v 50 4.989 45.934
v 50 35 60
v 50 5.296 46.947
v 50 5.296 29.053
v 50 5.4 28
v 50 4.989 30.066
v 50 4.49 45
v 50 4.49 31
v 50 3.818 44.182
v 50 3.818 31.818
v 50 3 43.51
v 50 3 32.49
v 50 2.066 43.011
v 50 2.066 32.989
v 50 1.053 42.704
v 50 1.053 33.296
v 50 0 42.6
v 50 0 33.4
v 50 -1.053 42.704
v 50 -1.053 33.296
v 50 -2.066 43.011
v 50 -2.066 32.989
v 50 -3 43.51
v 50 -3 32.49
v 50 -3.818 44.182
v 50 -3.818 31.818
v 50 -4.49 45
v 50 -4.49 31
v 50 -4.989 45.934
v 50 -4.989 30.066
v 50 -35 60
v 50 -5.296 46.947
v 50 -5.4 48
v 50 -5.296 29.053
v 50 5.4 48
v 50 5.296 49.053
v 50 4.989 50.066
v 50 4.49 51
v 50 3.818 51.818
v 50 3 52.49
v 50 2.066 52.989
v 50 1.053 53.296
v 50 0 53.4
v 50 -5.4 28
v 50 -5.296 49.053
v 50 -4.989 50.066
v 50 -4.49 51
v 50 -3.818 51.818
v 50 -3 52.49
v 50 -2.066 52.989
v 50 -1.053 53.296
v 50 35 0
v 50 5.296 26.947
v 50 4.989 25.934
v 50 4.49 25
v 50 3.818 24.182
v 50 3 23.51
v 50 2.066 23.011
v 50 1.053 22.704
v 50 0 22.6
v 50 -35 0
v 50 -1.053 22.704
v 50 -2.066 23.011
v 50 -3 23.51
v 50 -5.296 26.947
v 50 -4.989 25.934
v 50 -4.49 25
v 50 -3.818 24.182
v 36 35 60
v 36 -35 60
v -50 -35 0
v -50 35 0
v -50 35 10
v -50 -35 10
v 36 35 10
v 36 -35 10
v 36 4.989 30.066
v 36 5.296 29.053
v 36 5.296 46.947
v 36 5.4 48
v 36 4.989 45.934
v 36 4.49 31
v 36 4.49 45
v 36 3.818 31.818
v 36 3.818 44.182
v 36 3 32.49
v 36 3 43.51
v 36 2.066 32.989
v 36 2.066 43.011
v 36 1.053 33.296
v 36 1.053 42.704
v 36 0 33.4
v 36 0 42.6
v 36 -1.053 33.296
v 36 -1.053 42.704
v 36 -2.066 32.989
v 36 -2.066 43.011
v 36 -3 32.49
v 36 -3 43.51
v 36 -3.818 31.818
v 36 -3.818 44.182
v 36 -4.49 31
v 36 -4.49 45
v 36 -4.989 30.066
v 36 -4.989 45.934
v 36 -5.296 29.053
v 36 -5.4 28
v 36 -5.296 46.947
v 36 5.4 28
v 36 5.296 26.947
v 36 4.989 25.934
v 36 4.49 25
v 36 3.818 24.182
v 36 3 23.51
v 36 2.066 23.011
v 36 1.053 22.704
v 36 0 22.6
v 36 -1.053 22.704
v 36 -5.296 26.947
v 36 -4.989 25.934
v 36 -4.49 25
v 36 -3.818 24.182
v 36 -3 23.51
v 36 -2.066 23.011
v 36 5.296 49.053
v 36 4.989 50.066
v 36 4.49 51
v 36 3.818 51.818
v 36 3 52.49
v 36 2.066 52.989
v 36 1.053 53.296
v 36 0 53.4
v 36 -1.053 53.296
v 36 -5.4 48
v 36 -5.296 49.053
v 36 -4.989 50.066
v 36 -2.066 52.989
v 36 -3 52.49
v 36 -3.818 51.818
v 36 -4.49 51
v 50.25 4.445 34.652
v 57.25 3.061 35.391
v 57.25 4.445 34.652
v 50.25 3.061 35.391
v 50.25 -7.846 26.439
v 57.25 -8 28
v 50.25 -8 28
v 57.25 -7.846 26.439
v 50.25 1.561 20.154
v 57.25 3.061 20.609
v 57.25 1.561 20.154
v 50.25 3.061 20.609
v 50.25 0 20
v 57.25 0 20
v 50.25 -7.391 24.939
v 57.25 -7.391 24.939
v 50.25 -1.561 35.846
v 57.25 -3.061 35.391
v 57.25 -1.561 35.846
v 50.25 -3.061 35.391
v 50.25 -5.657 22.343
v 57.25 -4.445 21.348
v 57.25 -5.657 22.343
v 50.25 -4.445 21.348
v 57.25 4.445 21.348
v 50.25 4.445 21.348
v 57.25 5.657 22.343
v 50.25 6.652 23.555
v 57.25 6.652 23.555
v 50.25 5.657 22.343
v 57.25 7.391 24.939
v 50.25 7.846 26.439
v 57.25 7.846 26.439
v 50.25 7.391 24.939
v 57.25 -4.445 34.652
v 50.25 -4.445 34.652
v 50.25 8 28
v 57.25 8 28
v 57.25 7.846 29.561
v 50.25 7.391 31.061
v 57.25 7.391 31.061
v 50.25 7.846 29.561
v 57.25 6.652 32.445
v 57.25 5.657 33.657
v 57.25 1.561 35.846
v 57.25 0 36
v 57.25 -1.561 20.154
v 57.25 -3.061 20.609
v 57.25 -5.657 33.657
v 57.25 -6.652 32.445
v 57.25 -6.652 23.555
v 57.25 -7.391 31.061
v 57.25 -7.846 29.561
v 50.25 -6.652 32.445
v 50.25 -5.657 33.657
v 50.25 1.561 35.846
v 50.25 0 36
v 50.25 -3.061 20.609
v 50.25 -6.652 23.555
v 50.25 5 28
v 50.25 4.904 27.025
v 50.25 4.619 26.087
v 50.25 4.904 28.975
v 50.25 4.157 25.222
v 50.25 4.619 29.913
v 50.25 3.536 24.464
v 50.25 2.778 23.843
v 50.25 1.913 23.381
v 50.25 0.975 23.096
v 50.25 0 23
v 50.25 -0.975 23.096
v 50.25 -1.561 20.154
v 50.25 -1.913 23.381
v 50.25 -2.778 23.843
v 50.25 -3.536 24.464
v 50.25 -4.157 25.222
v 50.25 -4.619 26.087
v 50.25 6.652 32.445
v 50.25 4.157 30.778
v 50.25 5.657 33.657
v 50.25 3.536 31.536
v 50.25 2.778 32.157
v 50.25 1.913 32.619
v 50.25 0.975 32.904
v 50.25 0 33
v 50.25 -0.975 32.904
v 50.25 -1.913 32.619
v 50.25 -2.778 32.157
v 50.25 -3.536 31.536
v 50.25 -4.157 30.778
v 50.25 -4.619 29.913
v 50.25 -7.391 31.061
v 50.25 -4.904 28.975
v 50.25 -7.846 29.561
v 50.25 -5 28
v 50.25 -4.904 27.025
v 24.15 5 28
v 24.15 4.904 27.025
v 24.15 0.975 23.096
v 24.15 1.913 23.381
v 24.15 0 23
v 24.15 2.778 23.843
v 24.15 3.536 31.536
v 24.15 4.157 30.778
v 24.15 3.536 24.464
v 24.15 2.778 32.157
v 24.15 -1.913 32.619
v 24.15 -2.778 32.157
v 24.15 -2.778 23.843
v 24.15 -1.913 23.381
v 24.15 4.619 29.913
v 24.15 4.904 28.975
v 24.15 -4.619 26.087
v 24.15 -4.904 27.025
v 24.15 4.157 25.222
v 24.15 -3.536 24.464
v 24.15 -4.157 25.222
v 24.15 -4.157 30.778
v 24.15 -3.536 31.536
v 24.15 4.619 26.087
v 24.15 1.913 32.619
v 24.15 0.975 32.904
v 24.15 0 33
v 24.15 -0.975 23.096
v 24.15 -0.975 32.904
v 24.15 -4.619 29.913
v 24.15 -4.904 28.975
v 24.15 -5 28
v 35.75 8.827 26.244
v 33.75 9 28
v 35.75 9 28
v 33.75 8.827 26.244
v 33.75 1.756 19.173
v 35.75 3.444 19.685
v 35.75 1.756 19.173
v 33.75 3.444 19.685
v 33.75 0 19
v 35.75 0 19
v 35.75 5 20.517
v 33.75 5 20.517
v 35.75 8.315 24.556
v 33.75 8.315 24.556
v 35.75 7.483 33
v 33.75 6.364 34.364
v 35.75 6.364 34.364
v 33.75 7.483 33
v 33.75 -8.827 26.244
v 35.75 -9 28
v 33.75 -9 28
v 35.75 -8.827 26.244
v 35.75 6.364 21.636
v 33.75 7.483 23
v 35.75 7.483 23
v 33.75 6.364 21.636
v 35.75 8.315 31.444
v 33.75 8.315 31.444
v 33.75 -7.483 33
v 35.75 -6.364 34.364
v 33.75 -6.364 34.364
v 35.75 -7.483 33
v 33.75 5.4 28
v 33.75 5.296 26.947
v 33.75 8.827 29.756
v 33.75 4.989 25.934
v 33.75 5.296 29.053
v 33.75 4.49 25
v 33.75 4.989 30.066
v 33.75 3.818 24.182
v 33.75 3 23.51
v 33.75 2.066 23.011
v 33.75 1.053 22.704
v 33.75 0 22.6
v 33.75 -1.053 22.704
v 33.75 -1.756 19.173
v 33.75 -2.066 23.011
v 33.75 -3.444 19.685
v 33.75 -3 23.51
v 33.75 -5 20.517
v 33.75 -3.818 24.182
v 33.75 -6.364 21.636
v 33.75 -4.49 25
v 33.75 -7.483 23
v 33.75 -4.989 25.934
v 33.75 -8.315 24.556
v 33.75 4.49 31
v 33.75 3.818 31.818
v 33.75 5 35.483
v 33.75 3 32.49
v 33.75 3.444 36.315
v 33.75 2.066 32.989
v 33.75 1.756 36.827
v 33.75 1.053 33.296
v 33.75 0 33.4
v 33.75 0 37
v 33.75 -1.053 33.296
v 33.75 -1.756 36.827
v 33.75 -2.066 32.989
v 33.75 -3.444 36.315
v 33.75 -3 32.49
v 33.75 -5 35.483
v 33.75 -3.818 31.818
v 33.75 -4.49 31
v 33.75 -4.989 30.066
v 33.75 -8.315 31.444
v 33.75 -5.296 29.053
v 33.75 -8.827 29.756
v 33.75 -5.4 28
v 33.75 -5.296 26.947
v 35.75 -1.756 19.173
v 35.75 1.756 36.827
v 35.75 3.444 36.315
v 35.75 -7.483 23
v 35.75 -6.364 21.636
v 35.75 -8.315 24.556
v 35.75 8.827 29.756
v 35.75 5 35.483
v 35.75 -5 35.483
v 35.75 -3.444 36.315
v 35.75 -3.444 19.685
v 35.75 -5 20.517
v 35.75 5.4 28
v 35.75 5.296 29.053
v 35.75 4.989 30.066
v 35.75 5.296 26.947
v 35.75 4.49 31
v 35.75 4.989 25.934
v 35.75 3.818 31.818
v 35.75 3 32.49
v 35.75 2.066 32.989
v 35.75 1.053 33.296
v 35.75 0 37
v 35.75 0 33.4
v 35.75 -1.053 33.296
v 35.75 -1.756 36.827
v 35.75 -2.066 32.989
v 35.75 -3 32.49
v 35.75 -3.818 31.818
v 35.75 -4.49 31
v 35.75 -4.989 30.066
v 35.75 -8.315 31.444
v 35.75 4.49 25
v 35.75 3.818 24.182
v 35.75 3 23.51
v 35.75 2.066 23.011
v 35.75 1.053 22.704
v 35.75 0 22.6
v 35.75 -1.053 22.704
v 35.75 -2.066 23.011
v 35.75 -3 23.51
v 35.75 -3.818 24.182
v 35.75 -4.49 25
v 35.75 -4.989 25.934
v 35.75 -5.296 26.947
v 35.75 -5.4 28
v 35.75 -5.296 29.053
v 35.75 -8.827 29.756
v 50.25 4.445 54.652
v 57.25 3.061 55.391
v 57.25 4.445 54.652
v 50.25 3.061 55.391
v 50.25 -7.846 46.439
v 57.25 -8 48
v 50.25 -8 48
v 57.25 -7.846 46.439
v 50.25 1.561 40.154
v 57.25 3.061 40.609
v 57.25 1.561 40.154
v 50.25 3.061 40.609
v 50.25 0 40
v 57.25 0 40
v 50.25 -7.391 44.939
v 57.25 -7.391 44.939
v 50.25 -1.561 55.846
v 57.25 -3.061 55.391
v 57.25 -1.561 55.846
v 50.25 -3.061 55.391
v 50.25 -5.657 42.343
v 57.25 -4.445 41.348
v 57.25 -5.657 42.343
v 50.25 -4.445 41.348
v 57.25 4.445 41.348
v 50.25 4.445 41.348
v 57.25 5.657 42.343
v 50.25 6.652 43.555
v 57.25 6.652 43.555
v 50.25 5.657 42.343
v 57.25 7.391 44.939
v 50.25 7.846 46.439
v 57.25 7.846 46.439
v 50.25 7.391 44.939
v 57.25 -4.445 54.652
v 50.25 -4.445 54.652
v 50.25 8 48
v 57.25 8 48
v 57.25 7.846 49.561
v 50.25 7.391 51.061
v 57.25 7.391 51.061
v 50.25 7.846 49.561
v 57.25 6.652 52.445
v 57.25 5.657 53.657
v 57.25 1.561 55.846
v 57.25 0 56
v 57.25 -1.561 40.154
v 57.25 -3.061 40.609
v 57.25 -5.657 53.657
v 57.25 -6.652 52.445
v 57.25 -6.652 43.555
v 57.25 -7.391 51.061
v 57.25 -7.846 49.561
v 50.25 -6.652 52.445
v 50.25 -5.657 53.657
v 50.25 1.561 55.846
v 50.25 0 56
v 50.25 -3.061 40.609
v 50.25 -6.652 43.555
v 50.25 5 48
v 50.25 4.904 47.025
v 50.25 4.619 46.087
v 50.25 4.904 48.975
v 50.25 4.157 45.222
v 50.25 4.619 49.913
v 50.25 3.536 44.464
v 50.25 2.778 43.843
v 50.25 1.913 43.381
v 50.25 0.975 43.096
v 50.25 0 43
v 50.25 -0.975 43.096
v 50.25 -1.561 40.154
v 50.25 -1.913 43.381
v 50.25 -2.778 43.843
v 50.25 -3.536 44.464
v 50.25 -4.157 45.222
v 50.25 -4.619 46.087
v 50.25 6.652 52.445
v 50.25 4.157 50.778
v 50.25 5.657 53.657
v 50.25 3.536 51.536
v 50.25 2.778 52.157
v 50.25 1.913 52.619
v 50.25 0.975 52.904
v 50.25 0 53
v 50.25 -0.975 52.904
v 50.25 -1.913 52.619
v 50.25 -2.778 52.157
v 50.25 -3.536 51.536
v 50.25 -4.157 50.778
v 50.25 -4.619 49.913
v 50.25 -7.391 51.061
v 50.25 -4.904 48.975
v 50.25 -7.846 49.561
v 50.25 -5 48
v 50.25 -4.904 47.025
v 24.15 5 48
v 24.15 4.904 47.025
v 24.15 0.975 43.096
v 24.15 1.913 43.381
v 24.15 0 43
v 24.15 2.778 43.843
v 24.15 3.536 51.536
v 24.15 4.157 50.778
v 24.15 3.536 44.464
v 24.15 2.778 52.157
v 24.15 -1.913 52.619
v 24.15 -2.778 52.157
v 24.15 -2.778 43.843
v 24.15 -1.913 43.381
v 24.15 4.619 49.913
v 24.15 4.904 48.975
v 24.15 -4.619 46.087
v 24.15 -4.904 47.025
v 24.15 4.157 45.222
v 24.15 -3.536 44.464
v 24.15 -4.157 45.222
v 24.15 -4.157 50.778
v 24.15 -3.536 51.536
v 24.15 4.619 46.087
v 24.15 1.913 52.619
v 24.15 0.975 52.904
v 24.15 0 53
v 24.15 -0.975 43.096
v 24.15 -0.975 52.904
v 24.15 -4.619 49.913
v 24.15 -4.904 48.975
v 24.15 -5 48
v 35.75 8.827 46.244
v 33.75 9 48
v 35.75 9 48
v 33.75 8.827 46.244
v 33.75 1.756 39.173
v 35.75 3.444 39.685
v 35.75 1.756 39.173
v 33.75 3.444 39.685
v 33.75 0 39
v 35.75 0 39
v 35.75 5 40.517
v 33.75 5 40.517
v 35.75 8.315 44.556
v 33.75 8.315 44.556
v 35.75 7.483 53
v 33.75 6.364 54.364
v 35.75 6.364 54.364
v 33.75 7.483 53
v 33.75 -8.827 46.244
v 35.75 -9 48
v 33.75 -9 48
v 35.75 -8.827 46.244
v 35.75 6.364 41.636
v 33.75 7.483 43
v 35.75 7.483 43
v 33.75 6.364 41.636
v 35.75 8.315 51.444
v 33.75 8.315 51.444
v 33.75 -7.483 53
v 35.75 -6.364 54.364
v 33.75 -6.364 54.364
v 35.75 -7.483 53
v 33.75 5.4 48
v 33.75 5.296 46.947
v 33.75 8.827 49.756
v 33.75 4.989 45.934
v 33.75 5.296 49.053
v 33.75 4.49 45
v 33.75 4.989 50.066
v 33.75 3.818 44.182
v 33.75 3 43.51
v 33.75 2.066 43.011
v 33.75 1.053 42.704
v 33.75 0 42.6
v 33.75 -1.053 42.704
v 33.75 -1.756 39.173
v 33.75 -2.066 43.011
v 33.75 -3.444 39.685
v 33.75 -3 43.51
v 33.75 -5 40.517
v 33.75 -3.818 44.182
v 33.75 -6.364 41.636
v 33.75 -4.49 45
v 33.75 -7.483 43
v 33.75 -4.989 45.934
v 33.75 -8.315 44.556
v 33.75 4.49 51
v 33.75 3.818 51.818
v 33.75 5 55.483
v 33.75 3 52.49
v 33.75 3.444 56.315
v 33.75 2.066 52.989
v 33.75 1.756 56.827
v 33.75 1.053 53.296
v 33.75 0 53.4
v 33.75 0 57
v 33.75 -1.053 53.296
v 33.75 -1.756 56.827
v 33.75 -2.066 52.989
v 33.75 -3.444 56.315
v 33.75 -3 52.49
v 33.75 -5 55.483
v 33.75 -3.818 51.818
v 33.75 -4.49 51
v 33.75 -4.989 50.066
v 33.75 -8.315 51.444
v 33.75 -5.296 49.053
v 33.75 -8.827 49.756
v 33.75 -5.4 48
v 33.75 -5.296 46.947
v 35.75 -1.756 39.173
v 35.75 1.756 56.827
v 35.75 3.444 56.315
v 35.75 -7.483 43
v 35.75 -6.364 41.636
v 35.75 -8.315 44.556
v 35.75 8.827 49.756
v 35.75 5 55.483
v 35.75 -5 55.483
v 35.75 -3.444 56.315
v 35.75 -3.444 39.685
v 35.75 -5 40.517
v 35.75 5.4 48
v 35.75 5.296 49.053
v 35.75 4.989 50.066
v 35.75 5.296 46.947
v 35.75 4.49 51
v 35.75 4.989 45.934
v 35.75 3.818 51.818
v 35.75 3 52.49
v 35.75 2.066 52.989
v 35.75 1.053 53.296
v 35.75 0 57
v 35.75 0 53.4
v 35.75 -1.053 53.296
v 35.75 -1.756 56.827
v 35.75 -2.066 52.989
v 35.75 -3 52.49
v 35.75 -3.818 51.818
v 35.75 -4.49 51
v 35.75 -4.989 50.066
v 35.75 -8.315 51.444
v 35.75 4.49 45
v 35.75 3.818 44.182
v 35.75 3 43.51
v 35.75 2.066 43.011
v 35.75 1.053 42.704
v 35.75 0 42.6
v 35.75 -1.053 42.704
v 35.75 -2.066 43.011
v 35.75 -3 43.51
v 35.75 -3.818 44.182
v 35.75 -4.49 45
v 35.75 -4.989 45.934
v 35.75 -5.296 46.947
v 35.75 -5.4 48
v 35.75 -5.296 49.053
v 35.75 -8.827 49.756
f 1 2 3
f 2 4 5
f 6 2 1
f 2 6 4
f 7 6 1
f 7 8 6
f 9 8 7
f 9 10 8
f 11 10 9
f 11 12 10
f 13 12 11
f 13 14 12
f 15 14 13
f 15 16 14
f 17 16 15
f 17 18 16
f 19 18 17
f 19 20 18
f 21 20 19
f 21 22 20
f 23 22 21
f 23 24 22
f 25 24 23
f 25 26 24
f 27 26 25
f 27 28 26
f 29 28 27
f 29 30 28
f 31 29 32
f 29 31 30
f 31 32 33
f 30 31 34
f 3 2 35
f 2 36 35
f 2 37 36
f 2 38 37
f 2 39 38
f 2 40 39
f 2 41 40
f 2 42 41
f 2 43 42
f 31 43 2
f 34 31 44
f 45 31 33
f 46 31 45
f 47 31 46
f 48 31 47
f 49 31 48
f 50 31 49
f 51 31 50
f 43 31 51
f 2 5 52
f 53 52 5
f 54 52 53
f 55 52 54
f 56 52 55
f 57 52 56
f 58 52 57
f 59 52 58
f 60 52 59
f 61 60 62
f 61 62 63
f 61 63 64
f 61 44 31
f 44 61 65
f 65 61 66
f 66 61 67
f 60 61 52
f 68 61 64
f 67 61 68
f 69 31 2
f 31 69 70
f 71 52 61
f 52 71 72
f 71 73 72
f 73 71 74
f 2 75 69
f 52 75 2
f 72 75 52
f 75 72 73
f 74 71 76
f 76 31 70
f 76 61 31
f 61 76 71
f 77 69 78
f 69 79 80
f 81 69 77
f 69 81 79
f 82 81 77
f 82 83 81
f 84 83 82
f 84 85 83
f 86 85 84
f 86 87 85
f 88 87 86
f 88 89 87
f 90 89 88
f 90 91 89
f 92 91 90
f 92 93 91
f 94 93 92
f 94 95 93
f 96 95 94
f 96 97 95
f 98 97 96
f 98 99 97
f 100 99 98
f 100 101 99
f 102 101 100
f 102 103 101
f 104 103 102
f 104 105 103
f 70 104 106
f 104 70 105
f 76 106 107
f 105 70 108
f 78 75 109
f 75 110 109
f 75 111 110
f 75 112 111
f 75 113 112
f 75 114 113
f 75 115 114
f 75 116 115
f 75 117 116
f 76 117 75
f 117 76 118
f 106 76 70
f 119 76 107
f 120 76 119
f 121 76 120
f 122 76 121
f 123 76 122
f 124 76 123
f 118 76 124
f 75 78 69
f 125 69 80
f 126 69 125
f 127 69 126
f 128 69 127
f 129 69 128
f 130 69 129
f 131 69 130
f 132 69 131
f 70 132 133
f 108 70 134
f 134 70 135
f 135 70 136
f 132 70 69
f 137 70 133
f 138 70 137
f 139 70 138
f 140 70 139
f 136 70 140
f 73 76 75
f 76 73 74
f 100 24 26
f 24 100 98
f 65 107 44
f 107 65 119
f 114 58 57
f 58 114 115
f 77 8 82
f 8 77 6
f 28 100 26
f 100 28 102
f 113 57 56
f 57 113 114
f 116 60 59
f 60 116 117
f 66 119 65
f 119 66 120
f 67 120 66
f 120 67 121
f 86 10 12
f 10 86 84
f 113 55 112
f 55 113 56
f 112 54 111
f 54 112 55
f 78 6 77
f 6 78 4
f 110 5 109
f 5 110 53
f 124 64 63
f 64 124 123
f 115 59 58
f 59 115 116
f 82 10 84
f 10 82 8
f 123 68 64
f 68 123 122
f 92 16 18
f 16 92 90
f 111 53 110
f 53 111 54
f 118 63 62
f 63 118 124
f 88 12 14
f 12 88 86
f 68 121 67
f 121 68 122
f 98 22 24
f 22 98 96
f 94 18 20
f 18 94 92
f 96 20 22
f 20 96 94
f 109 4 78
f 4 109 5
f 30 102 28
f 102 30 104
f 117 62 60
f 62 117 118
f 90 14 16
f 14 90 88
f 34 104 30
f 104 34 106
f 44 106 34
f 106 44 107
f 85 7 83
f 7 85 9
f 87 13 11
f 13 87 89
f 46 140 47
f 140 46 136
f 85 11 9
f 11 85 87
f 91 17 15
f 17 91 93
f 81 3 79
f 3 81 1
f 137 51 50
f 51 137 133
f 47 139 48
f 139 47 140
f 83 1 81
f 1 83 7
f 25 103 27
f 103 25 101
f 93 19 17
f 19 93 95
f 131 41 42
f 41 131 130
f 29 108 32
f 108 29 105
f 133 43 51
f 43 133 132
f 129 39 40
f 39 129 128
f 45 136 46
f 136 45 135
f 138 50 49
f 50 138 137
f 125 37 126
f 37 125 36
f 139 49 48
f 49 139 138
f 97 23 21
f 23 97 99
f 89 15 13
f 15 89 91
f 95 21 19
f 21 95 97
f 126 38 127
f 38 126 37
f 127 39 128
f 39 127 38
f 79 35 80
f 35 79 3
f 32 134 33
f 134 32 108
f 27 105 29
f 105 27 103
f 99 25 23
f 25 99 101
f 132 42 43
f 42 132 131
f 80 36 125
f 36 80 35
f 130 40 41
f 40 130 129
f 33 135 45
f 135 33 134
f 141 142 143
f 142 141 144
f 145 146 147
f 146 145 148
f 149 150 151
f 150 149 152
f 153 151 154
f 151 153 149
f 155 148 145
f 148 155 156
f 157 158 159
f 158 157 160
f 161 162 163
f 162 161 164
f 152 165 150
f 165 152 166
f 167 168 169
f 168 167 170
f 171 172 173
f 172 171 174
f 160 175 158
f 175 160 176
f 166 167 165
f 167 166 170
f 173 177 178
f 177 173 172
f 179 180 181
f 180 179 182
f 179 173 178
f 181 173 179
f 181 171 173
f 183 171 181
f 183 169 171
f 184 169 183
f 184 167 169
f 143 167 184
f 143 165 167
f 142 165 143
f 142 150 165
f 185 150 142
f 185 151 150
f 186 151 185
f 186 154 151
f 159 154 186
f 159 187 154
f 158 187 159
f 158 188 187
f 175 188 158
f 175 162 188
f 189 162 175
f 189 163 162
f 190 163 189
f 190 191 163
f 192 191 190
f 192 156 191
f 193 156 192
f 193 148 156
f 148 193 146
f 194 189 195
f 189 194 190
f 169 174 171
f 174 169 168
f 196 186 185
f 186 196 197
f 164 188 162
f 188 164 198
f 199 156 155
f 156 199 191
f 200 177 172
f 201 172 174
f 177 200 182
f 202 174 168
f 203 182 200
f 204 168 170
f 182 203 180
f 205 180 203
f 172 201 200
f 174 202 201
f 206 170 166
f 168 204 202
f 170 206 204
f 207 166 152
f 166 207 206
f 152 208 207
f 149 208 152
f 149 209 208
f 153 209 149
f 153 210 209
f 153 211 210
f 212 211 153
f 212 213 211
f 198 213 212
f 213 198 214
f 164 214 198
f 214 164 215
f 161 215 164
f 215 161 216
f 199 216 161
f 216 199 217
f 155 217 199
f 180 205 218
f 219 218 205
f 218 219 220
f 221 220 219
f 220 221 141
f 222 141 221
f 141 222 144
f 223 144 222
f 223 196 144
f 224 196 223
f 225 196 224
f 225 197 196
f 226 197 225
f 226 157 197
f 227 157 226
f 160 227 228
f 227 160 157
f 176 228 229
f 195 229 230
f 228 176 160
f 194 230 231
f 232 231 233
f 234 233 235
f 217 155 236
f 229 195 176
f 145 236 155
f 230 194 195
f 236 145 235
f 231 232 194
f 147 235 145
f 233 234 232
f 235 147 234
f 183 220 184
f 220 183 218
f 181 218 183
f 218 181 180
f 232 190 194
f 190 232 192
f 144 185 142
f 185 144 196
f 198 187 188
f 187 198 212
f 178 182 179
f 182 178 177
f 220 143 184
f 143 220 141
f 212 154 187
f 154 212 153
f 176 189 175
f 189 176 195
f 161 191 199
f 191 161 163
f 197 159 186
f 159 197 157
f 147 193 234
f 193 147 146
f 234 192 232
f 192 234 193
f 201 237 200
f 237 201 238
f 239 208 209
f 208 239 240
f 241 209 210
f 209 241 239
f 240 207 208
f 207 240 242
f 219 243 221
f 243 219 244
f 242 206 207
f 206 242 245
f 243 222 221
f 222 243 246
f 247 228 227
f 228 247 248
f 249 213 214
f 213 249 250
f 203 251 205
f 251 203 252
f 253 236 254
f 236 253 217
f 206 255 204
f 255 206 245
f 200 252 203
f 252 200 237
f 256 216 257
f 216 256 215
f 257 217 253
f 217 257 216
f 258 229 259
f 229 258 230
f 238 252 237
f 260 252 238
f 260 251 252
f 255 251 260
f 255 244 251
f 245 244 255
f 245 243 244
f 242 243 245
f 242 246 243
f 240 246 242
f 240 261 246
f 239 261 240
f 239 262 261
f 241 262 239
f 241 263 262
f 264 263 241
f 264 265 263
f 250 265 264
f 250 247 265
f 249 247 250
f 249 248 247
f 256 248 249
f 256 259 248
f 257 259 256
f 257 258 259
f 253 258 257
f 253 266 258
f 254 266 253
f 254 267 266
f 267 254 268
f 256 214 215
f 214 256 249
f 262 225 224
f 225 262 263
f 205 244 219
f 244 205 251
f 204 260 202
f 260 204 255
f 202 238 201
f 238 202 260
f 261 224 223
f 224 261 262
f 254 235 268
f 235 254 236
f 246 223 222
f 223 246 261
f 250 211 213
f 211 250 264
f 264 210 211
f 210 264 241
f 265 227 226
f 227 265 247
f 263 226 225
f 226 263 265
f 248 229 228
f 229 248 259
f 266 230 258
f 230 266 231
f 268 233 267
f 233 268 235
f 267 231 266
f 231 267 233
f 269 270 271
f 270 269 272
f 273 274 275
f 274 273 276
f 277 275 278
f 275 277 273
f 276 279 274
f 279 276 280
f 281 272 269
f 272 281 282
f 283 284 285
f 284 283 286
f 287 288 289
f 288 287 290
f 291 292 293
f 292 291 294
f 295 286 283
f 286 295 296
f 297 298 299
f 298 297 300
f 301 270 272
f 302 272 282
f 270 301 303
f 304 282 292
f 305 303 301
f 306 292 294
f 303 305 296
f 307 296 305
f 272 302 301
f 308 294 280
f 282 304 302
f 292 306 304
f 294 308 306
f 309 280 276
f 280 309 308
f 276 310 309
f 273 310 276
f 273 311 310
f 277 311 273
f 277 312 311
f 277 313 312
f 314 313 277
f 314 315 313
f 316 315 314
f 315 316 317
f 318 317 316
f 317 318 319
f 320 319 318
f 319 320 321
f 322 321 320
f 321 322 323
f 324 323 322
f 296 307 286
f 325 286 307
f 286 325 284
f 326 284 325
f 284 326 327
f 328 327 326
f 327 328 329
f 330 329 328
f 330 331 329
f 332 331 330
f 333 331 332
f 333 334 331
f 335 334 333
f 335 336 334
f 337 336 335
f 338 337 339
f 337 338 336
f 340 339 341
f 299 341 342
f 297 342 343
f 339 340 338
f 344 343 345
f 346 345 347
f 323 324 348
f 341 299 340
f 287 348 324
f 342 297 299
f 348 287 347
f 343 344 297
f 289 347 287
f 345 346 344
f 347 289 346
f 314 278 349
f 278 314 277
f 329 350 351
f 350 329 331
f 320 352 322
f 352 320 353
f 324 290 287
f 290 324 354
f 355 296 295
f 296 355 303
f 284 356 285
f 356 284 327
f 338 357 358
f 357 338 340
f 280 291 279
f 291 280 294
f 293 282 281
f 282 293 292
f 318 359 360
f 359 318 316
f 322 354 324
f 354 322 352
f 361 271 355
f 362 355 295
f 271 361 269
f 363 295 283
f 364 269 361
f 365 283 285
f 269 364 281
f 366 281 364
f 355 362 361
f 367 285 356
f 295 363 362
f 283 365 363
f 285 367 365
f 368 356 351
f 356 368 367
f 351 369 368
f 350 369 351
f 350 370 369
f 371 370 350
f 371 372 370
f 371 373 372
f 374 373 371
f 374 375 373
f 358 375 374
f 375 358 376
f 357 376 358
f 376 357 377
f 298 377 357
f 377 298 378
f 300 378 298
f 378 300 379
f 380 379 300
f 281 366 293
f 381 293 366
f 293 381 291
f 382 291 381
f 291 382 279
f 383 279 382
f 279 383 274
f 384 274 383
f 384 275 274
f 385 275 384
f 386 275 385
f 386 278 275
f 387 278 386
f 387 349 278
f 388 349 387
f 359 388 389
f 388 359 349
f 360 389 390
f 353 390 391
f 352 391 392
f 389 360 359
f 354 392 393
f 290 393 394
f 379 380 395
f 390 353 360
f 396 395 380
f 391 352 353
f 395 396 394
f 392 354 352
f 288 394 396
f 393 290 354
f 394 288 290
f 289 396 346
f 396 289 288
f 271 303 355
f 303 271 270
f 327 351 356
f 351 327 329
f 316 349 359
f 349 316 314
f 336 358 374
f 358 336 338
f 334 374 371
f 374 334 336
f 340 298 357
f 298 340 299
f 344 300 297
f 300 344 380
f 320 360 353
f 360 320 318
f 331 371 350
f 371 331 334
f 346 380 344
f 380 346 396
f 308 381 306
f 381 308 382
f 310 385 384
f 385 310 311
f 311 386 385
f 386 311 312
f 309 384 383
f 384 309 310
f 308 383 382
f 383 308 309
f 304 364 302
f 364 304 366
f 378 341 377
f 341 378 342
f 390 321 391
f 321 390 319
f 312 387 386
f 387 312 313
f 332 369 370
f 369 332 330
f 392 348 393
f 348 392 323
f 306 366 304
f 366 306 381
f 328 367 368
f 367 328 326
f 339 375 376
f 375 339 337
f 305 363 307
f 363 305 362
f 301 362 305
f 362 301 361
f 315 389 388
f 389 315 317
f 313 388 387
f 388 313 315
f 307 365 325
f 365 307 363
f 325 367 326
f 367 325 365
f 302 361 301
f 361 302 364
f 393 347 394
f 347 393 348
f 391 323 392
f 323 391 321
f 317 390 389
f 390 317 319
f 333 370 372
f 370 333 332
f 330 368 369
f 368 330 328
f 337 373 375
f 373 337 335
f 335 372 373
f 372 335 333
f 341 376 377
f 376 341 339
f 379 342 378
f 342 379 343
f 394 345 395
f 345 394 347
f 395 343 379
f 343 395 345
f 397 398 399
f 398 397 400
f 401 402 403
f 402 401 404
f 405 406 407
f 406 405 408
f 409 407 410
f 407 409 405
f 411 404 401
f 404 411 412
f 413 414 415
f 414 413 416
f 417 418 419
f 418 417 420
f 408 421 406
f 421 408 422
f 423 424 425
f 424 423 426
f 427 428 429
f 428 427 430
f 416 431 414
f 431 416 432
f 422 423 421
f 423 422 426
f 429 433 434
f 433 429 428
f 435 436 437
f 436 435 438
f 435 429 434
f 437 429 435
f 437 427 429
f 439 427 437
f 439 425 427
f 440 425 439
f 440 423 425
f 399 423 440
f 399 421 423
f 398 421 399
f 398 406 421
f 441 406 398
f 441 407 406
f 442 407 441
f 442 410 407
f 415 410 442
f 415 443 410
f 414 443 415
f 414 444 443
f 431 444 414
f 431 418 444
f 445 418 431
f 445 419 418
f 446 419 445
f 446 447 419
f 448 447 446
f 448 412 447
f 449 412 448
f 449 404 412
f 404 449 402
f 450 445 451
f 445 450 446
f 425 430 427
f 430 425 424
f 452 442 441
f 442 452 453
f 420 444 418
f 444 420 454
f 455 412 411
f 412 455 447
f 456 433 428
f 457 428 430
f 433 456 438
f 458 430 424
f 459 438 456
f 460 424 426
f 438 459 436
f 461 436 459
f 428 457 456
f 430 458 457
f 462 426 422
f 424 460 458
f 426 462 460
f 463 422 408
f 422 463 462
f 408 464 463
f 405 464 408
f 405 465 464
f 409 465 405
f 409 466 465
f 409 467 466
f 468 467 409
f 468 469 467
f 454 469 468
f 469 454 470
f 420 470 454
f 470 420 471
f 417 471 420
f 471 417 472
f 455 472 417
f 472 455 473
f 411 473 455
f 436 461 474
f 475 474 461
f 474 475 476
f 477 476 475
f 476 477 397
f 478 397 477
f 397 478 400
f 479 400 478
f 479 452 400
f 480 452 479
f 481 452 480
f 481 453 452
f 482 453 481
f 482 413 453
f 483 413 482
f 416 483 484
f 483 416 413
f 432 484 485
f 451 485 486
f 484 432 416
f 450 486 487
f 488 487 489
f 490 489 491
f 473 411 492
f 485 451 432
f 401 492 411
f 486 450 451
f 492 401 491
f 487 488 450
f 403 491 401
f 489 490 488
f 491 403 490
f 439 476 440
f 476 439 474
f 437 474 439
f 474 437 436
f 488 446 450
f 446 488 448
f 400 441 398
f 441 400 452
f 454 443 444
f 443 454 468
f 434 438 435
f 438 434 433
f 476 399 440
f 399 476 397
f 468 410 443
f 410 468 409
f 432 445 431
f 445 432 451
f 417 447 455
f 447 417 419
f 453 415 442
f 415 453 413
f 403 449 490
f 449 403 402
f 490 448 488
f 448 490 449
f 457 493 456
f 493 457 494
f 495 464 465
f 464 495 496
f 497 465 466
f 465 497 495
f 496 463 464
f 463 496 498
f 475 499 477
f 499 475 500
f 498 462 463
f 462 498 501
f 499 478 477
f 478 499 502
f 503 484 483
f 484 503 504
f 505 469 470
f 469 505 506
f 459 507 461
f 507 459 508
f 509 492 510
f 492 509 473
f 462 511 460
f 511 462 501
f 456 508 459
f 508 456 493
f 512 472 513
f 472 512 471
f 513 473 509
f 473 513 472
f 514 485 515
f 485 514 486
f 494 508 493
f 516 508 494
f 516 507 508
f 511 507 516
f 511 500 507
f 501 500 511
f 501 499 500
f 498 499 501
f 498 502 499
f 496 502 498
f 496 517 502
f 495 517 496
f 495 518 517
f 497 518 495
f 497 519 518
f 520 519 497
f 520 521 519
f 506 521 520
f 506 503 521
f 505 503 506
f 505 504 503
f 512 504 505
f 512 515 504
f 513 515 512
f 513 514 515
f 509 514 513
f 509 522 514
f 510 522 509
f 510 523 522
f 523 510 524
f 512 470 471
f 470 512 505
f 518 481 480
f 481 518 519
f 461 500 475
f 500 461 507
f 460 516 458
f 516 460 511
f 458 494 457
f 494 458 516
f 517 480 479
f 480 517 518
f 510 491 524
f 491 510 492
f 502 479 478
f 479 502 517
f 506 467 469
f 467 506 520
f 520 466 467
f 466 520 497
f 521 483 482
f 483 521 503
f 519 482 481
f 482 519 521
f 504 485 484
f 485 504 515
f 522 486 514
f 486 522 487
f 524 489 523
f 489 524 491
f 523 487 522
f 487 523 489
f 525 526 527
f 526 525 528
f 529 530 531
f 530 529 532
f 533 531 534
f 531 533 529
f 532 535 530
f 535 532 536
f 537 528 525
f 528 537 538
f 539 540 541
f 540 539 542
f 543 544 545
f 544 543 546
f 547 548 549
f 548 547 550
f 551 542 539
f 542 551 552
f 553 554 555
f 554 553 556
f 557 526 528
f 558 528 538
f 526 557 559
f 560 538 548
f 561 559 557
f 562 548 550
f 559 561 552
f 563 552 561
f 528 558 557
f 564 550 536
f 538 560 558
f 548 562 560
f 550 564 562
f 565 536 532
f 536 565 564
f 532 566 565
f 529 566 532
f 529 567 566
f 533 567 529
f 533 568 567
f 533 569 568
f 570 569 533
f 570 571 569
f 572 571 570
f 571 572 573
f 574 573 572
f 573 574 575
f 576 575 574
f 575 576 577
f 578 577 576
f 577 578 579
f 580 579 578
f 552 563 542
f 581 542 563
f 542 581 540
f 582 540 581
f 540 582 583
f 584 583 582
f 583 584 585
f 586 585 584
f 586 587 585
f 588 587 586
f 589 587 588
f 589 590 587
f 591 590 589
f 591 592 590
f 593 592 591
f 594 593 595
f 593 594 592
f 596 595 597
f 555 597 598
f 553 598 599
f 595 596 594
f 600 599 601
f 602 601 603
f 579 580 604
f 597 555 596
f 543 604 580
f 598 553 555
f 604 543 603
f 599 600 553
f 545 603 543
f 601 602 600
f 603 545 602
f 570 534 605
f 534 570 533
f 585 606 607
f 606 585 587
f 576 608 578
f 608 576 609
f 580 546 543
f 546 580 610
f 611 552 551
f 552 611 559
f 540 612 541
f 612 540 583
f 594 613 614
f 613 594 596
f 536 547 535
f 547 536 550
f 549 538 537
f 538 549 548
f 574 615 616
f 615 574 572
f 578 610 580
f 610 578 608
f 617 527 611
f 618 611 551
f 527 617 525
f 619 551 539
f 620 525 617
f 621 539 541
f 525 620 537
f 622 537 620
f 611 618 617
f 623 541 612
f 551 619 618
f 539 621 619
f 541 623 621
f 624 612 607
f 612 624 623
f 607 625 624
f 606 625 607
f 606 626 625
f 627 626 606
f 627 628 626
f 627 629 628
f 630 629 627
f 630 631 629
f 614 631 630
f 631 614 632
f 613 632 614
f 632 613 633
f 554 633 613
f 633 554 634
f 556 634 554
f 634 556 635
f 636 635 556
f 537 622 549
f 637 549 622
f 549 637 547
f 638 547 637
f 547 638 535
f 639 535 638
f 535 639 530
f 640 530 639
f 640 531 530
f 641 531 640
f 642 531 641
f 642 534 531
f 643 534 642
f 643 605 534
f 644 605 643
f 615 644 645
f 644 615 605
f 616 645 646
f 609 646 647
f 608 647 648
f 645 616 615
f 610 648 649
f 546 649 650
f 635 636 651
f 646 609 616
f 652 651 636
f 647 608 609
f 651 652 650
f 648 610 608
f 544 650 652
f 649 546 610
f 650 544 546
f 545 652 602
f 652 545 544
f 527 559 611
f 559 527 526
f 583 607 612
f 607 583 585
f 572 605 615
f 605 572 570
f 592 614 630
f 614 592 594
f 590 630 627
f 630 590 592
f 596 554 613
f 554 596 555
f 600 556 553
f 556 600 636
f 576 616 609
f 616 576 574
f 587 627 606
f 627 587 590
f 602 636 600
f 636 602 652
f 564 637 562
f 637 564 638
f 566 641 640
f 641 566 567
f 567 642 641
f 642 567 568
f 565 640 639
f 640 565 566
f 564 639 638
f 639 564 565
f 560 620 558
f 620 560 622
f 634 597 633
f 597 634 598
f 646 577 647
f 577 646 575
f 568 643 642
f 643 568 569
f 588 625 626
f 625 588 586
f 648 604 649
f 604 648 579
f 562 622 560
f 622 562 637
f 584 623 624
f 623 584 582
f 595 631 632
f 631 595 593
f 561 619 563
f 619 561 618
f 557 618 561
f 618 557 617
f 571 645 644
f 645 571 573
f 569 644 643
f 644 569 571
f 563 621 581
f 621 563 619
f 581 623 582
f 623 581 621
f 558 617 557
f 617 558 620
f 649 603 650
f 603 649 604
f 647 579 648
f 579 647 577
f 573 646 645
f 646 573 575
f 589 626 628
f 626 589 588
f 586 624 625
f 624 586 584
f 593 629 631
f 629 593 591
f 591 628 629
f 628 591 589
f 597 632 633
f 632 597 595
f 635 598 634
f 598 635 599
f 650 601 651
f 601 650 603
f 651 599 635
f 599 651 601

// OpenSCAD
$fn = 32;

// ------------------------------------------------------------------------
// Bolted bracket: 100 x 70 mm bracket with 2 bolt joints
// Every part is its own module, assembly() places them once.
// ------------------------------------------------------------------------

// --- part 1 ---
module bracket() {
  difference() {
    translate([-50, -35, 0]) cube([100, 70, 60]);
    translate([-51, -36, 10]) cube([87, 72, 51]);
    translate([43, 0, 28]) rotate([0, 90, 0]) cylinder(h = 16, d = 10.8, center = true);
    translate([43, 0, 48]) rotate([0, 90, 0]) cylinder(h = 16, d = 10.8, center = true);
  }
}

// --- part 2 ---
module bolt1() {
  cylinder(h = 7, d = 16);
  translate([0, 0, -26.1]) cylinder(h = 26.1, d = 10);
}

// --- part 3 ---
module washer1() {
  difference() {
      translate([0, 0, 0]) cylinder(h = 2, d = 18);
      translate([0, 0, -1]) cylinder(h = 4, d = 10.8);
    }
}

// --- part 4 ---
module bolt2() {
  cylinder(h = 7, d = 16);
  translate([0, 0, -26.1]) cylinder(h = 26.1, d = 10);
}

// --- part 5 ---
module washer2() {
  difference() {
      translate([0, 0, 0]) cylinder(h = 2, d = 18);
      translate([0, 0, -1]) cylinder(h = 4, d = 10.8);
    }
}

// --- assembly ---
module assembly() {
  translate([0, 0, 0]) rotate([0, 0, 0]) bracket();
  translate([50.25, 0, 28]) rotate([0, 90, 0]) bolt1();
  translate([33.75, 0, 28]) rotate([0, 90, 0]) washer1();
  translate([50.25, 0, 48]) rotate([0, 90, 0]) bolt2();
  translate([33.75, 0, 48]) rotate([0, 90, 0]) washer2();
}

assembly();
